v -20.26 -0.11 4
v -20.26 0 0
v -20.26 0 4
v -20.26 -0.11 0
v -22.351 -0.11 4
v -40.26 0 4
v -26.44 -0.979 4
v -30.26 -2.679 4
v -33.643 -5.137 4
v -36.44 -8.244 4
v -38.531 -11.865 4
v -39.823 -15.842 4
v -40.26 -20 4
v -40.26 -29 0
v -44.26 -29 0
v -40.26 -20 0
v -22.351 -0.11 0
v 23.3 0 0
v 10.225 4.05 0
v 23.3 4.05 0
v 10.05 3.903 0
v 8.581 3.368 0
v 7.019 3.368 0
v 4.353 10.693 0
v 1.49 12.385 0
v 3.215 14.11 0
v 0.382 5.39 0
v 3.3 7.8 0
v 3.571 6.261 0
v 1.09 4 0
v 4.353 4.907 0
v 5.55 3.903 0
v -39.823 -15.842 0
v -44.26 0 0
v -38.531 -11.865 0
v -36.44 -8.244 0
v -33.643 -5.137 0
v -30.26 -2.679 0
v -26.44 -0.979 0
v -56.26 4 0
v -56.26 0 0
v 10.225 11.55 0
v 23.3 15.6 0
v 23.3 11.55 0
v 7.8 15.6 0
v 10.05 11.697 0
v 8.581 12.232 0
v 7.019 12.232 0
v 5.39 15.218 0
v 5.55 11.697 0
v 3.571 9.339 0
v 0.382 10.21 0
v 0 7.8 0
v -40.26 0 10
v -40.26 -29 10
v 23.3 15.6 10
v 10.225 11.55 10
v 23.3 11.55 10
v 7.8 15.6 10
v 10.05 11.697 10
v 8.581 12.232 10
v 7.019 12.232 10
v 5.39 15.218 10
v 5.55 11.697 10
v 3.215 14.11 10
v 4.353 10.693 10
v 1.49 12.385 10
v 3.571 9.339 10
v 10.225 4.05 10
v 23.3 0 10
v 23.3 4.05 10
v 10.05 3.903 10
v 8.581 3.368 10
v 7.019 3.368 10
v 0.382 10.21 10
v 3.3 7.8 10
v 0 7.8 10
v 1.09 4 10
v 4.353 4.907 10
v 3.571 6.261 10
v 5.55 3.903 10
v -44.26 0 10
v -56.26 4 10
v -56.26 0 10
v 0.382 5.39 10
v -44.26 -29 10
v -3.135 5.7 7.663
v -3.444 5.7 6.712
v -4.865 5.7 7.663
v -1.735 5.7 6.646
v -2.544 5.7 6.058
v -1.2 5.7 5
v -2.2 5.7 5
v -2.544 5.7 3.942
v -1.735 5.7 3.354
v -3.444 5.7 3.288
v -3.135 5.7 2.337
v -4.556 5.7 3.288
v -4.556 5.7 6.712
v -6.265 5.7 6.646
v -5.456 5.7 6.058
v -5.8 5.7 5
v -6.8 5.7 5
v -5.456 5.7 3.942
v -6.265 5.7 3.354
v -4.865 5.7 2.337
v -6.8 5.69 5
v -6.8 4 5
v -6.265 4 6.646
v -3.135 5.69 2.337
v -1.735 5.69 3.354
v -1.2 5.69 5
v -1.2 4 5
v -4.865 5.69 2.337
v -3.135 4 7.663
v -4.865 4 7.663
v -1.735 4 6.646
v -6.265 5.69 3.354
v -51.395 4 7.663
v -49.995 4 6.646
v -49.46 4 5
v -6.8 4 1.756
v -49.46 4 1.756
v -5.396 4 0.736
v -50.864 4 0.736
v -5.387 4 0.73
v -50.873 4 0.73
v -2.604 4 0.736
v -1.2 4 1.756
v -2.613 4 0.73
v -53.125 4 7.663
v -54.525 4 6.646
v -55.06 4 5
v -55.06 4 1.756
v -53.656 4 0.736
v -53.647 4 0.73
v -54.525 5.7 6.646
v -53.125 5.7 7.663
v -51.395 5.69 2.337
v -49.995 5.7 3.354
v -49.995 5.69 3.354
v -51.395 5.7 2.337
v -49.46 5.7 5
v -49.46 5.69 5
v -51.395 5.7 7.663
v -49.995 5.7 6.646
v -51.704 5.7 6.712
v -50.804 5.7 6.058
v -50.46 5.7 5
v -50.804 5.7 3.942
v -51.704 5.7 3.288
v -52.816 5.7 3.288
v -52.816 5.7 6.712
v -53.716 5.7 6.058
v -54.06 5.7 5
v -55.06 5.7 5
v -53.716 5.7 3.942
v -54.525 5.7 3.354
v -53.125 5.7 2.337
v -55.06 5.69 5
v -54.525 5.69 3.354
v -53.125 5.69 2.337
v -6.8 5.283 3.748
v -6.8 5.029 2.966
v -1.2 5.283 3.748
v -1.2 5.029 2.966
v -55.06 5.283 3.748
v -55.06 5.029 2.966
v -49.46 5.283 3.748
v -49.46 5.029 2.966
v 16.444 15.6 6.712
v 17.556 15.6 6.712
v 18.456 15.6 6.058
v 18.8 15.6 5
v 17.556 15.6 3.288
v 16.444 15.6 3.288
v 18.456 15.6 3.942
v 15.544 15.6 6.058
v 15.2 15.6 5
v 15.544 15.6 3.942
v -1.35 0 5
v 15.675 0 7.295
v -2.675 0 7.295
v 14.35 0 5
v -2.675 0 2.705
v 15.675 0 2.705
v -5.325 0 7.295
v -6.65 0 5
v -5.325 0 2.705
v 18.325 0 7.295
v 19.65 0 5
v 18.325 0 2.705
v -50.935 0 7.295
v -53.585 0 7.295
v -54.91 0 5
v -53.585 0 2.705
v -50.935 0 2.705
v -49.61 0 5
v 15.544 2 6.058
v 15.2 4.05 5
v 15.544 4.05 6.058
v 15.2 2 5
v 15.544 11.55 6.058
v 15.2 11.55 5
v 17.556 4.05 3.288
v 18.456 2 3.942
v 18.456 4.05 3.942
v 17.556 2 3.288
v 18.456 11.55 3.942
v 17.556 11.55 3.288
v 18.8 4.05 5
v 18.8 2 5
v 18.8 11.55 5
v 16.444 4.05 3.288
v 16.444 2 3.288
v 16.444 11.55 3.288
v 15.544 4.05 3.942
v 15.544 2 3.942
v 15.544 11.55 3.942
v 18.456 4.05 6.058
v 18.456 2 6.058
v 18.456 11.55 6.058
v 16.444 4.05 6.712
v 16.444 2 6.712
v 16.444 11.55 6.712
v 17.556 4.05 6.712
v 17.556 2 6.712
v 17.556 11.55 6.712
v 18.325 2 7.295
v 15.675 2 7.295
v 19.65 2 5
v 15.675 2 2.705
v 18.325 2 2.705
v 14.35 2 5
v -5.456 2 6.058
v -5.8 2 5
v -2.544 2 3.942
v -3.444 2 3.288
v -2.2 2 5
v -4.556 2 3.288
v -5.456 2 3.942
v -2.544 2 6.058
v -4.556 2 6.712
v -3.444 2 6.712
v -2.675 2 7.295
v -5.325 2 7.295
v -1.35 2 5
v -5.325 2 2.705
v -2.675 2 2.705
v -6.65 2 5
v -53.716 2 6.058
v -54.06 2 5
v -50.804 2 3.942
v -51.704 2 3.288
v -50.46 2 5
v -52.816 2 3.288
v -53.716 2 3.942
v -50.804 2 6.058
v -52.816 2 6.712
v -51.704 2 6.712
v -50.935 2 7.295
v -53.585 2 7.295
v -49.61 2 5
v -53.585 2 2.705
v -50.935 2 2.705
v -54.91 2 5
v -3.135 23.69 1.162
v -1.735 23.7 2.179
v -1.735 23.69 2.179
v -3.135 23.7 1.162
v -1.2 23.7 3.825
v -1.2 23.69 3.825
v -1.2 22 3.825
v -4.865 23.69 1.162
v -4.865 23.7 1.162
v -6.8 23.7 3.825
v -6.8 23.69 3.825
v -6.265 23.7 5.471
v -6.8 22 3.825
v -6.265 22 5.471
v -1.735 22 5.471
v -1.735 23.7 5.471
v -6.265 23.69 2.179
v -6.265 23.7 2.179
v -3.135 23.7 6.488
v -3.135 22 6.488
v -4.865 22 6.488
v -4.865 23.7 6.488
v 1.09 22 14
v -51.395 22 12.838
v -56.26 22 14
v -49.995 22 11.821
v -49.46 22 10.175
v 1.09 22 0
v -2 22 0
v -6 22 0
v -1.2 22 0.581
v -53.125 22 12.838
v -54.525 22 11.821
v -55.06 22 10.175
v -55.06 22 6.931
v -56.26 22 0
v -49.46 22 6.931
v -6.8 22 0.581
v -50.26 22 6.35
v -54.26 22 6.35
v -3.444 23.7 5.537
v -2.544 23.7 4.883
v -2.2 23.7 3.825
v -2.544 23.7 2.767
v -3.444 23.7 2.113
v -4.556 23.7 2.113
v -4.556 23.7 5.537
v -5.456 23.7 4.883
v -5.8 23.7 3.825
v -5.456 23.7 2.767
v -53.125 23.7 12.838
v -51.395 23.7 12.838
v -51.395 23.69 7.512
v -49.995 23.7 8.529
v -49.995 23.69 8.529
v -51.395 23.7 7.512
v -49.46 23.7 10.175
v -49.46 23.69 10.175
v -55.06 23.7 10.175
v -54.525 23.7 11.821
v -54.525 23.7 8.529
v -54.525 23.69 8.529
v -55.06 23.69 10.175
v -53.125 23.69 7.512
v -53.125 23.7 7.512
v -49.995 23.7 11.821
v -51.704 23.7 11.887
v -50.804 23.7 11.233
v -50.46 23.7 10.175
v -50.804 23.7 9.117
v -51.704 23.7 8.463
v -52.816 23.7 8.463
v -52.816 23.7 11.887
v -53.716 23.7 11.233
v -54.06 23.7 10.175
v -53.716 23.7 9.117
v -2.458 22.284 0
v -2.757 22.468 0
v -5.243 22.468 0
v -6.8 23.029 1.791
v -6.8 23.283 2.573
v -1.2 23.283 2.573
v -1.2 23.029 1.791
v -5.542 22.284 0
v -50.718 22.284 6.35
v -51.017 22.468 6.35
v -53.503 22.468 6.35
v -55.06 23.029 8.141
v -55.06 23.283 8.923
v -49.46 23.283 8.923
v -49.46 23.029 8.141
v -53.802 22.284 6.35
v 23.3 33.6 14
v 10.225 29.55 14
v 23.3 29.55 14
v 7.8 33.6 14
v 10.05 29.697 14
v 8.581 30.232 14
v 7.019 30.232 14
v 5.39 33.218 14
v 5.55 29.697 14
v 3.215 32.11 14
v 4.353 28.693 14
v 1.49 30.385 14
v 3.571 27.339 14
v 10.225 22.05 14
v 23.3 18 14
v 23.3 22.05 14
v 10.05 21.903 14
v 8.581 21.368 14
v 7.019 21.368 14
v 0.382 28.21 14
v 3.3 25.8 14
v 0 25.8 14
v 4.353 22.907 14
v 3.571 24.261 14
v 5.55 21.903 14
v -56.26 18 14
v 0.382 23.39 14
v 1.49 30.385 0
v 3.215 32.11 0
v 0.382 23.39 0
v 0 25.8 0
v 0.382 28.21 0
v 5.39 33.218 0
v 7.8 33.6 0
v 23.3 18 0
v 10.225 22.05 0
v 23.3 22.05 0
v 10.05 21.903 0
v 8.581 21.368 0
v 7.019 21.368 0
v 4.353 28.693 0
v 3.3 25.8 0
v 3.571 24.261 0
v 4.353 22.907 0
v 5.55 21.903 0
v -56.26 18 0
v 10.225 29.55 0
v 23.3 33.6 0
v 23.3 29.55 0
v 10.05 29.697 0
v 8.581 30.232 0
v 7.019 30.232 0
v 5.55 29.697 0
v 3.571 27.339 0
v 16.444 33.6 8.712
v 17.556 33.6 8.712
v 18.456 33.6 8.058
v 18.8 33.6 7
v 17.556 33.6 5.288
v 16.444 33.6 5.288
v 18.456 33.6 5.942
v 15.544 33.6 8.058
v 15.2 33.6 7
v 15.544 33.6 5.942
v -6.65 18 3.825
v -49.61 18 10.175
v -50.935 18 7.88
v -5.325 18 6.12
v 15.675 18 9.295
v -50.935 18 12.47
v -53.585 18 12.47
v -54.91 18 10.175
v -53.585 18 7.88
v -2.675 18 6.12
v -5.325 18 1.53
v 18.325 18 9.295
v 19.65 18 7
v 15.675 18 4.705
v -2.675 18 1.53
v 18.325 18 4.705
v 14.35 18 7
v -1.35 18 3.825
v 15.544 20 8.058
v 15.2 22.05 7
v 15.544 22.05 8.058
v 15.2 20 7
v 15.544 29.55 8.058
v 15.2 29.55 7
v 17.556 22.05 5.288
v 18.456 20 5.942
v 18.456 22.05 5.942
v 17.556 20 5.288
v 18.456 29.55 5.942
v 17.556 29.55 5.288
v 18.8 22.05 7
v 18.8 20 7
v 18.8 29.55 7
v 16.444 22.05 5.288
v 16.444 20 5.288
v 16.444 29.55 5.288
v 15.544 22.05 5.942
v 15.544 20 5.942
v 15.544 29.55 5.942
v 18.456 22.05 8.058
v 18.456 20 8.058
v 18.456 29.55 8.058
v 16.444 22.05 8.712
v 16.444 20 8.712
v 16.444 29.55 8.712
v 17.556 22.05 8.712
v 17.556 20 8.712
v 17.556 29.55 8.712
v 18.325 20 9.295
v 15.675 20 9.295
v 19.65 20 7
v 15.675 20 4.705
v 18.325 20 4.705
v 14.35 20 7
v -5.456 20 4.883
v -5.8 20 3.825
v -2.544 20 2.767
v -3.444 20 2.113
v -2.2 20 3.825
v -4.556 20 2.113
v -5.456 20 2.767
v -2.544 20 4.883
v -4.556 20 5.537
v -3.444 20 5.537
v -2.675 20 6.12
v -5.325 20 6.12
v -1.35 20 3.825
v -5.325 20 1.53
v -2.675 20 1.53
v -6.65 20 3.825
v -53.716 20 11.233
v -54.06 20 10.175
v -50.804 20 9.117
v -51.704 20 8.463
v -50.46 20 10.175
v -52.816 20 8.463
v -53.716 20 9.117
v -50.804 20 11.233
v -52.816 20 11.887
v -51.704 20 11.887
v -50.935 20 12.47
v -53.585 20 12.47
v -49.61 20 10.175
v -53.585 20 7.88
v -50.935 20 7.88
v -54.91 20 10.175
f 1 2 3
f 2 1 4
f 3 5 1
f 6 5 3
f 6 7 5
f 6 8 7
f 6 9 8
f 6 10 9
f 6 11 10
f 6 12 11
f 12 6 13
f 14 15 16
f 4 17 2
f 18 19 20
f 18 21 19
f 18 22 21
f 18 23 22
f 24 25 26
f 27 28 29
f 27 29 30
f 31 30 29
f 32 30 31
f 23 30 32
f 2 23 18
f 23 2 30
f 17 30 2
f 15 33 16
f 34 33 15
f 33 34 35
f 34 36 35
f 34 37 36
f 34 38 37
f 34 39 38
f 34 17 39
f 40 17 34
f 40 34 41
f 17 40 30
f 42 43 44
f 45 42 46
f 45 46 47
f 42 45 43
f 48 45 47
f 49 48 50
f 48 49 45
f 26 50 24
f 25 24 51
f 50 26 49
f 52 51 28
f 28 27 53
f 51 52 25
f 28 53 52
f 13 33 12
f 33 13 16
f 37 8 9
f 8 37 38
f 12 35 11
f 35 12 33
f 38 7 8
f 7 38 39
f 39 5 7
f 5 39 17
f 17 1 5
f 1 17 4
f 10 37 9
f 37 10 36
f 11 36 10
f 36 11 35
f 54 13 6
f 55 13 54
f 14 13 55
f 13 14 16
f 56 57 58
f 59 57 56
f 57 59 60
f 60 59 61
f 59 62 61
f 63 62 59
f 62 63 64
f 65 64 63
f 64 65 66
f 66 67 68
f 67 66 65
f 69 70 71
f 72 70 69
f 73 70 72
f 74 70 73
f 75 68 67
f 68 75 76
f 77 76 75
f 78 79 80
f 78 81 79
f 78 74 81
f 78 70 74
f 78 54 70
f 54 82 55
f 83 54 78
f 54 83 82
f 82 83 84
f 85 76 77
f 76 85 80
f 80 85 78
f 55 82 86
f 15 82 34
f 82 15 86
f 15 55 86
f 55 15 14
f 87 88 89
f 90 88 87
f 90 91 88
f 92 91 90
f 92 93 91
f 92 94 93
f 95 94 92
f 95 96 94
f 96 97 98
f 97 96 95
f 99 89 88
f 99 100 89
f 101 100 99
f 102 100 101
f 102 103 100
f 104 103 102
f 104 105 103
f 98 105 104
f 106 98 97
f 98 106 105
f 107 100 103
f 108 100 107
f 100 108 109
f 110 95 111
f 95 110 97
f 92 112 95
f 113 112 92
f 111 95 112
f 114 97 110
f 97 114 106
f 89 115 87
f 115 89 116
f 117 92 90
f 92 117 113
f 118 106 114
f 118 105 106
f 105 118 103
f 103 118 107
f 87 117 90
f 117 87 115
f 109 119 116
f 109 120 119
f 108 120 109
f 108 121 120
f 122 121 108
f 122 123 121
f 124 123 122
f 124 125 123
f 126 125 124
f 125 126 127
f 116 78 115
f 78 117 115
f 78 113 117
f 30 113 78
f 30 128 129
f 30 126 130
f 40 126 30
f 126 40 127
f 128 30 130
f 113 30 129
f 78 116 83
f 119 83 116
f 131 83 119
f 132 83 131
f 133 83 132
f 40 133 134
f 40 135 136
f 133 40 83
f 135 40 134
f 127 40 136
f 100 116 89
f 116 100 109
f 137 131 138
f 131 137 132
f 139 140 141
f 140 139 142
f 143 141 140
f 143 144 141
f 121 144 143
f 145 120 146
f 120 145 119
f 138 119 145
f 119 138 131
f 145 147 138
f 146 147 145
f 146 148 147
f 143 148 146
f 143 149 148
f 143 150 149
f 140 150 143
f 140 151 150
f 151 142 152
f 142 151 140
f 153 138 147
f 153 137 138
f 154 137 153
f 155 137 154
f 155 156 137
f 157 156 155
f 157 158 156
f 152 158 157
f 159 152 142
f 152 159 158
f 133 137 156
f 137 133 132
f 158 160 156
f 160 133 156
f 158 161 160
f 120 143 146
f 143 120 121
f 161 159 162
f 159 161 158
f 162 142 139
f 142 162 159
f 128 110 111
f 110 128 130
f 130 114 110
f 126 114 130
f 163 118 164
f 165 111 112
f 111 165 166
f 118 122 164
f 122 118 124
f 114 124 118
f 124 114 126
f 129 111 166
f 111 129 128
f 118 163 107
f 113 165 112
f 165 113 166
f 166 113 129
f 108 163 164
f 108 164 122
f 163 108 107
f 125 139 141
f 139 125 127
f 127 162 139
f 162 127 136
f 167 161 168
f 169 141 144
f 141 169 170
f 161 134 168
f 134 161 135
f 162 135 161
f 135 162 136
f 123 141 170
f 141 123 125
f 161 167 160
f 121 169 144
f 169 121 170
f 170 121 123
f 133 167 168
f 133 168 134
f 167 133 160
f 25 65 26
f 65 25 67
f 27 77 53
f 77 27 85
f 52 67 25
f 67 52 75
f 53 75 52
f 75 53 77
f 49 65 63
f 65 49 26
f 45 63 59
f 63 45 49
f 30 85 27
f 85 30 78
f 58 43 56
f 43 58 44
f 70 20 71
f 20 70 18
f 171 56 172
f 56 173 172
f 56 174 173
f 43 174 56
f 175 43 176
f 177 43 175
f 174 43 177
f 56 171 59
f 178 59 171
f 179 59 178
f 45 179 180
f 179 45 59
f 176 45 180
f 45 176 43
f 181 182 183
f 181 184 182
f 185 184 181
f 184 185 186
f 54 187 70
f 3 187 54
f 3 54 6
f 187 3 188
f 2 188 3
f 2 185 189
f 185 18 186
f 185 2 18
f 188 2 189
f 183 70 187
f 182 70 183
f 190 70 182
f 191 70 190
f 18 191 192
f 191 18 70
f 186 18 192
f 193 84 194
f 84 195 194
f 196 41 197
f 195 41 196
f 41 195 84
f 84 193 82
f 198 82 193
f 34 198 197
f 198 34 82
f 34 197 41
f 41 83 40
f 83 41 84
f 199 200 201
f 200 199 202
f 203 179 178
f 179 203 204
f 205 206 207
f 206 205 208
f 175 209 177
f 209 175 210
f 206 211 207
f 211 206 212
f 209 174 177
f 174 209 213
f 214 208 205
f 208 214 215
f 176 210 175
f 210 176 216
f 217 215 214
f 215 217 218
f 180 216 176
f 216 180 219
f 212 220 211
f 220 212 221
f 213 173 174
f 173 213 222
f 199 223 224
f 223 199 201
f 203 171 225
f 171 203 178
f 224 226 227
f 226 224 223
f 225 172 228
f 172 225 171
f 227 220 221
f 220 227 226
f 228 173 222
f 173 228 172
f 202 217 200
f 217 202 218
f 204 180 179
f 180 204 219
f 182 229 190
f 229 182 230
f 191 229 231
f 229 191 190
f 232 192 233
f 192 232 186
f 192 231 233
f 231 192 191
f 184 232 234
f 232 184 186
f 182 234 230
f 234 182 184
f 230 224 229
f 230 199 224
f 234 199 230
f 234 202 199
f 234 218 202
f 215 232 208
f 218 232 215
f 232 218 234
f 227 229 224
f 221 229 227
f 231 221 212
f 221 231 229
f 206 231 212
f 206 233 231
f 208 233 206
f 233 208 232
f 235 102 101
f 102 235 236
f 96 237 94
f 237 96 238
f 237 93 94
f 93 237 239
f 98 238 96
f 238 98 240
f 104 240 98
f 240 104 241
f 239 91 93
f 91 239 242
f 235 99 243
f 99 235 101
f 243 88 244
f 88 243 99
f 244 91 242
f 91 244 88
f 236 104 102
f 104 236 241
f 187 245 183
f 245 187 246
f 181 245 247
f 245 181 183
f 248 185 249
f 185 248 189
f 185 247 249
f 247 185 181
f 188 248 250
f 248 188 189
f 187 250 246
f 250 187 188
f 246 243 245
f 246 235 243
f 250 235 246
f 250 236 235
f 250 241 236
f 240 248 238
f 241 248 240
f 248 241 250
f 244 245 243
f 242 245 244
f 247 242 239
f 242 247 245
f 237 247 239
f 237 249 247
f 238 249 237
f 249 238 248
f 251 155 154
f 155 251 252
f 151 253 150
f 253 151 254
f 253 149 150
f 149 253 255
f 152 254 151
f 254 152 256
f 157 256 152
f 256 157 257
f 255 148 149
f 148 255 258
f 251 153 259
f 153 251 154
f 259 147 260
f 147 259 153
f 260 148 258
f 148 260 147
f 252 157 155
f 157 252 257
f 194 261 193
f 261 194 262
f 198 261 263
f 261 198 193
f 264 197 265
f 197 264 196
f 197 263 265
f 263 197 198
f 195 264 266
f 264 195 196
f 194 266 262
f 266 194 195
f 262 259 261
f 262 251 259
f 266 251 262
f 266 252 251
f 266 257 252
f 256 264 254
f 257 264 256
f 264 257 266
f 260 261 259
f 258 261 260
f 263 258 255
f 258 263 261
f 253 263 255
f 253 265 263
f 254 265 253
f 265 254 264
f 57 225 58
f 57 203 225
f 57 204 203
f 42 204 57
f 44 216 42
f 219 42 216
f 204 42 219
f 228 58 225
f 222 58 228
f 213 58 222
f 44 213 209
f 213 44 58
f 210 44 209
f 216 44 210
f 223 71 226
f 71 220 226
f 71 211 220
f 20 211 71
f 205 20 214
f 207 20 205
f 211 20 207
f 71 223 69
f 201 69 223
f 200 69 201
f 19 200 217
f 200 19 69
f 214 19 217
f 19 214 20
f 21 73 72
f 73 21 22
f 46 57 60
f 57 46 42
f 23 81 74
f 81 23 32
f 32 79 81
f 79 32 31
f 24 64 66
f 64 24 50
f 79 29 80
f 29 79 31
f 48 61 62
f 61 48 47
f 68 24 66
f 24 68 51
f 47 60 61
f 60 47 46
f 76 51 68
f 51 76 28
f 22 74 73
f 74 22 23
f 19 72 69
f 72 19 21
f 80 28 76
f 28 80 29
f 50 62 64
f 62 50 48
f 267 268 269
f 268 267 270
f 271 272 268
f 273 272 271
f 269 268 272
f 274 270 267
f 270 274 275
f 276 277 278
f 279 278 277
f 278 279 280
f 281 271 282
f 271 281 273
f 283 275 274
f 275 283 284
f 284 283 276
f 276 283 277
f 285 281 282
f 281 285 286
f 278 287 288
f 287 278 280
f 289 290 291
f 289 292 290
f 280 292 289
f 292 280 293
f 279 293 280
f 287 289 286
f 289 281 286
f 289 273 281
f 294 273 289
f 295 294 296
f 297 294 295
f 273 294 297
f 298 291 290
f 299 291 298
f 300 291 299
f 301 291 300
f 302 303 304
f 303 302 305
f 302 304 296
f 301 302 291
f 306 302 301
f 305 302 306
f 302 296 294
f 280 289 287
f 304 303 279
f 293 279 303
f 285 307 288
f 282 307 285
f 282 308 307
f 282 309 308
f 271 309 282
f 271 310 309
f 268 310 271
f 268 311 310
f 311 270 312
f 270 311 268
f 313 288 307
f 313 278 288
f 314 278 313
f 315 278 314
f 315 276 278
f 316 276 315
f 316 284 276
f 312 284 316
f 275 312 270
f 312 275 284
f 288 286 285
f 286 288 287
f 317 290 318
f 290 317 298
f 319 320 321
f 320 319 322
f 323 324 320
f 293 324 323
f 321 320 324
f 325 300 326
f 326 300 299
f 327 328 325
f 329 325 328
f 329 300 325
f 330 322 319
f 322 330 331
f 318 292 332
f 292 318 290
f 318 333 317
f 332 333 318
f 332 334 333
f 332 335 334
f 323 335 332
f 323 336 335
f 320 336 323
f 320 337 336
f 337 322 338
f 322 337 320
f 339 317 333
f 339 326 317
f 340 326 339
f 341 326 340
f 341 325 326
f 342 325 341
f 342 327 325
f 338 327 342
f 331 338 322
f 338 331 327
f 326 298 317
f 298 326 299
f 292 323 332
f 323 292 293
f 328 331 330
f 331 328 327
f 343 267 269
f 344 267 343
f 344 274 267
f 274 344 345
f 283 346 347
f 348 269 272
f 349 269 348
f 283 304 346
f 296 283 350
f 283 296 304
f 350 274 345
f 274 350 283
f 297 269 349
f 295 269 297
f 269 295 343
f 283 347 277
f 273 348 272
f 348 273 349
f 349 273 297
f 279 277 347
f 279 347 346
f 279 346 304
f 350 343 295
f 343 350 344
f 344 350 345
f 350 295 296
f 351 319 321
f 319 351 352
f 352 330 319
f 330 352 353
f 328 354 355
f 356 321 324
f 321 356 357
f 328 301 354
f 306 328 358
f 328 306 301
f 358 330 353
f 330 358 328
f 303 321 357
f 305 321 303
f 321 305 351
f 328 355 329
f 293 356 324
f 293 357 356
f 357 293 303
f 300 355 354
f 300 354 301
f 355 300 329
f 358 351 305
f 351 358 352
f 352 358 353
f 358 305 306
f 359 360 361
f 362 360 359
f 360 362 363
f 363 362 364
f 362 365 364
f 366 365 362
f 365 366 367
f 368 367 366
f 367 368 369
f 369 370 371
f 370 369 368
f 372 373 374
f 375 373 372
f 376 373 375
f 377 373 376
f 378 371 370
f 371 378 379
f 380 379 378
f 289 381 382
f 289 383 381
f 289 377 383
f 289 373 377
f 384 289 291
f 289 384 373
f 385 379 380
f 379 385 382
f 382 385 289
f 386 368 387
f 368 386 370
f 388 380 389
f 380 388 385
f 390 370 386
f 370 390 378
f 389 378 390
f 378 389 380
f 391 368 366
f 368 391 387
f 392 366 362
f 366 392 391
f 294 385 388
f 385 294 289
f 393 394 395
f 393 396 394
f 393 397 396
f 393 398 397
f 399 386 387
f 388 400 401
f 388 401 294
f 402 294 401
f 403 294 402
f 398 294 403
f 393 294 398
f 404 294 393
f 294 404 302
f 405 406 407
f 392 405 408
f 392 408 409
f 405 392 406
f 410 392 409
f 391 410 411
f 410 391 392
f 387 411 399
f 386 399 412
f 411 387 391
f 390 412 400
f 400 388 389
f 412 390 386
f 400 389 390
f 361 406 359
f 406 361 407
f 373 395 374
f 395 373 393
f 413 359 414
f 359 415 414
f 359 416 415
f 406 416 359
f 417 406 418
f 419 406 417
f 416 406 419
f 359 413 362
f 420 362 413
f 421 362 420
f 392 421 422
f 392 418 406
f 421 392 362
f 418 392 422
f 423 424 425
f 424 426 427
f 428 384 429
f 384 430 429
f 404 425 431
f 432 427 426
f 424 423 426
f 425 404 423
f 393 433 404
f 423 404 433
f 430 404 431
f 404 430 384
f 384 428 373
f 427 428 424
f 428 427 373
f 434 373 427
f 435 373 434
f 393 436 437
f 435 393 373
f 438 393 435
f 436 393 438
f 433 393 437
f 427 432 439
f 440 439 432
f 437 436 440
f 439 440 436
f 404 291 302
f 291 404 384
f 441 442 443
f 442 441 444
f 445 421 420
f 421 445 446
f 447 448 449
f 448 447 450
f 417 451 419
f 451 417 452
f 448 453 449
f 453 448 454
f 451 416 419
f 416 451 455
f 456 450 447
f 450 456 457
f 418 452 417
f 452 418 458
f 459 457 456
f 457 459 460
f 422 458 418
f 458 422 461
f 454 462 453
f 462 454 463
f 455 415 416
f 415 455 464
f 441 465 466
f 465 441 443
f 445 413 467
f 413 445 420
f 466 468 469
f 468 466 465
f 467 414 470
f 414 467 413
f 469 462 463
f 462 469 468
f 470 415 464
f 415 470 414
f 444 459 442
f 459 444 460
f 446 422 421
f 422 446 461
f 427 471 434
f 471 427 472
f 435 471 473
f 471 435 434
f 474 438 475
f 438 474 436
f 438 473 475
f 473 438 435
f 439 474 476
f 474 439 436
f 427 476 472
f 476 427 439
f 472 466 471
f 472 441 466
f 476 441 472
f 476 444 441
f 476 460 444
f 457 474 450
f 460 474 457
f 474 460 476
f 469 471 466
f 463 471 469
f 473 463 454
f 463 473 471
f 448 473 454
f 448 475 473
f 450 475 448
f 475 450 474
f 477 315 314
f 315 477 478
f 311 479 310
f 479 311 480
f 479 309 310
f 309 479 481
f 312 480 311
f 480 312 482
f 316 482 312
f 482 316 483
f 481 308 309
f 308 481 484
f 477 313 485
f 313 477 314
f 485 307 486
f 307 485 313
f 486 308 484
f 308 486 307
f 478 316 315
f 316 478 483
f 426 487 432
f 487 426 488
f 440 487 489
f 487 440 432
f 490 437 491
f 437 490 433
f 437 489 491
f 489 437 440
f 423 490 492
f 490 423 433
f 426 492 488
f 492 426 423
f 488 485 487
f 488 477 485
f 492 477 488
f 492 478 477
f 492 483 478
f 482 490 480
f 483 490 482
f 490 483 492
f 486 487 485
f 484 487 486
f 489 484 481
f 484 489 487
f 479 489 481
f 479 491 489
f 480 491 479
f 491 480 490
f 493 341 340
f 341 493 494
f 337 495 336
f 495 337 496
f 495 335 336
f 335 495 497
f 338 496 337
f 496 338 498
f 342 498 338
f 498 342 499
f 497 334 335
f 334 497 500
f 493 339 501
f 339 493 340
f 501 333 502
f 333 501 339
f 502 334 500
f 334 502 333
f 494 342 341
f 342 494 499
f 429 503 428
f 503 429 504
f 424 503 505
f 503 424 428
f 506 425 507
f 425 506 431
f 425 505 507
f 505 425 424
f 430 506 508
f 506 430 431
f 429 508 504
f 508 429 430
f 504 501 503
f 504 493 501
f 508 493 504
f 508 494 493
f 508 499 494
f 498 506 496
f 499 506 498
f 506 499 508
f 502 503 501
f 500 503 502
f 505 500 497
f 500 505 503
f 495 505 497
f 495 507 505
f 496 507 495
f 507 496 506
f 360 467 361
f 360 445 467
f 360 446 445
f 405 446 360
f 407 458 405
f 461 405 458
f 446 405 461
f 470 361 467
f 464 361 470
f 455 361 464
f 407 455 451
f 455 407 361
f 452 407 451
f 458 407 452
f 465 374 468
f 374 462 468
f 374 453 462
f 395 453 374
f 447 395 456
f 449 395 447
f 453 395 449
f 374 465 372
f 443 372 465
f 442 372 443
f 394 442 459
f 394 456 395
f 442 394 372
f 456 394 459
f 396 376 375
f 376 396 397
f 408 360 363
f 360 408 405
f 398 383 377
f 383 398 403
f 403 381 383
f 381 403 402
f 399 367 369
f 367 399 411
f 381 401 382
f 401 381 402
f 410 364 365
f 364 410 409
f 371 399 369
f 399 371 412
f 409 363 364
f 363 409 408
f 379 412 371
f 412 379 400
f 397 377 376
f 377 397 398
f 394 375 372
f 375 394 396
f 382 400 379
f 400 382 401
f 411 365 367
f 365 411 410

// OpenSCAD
// file: functions.scad
// PRUSA Mendel  
// Functions used in many files
// GNU GPL v3
// Josef Průša
// josefprusa@me.com
// prusadjs.cz
// http://www.reprap.org/wiki/Prusa_Mendel
// http://github.com/prusajr/PrusaMendel


module nut(d,h,horizontal=true){
cornerdiameter =  (d / 2) / cos (180 / 6);
cylinder(h = h, r = cornerdiameter, $fn = 6);
if(horizontal){
for(i = [1:6]){
	rotate([0,0,60*i]) translate([-cornerdiameter-0.2,0,0]) rotate([0,0,-45]) cube(size = [2,2,h]);
}}
}

// Based on nophead research
module polyhole(d,h) {
    n = max(round(2 * d),3);
    rotate([0,0,180])
        cylinder(h = h, r = (d / 2) / cos (180 / n), $fn = n);
}




module roundcorner(diameter){
	difference(){
		cube(size = [diameter,diameter,99], center = false);
		translate(v = [diameter, diameter, 0]) cylinder(h = 100, r=diameter, center=true);
	}
}
// file: metric.scad
// PRUSA Mendel  
// Default metric sizes
// GNU GPL v3
// Josef Průša
// josefprusa@me.com
// prusadjs.cz
// http://www.reprap.org/wiki/Prusa_Mendel
// http://github.com/prusajr/PrusaMendel

// DONT CHANGE THIS FILE! ALTER VALUES IN CONFIGURATION.SCAD INSTEAD

// RODS

threaded_rod_diameter = 8.7;
threaded_rod_diameter_horizontal = 8.7;
smooth_bar_diameter = 8;
smooth_bar_diameter_horizontal = 8.5;

// Nuts and bolts

m8_diameter = 9;
m8_nut_diameter = 14.1;

m4_diameter = 4.5;
m4_nut_diameter = 9;

m3_diameter = 3.6;
m3_nut_diameter = 5.3;
m3_nut_diameter_horizontal = 6.1;

// Bushing holder

bushing_core_diameter = smooth_bar_diameter;
bushing_material_thickness = 1;

// Motors

motor_shaft = 5.5;
// file: configuration.scad
// PRUSA Mendel  
// Configuration file
// GNU GPL v3
// Josef Průša
// josefprusa@me.com
// prusadjs.cz
// http://www.reprap.org/wiki/Prusa_Mendel
// http://github.com/prusajr/PrusaMendel

// PLEASE SELECT ONE OF THE CONFIGURATIONS BELOW
// BY UN-COMMENTING IT

// Uncomment for metric settings
// METRIC METRIC METRIC METRIC METRIC METRIC METRIC METRIC 

include <metric.scad>;

// CUSTOM CUSTOM CUSTOM CUSTOM CUSTOM CUSTOM CUSTOM CUSTOM CUSTOM

thin_wall = 3;


// Linear bearing version
linear = false;
// set false for LM-8UU, true for LM-E-8UU (ignore if linear is set to false)
lme8uu = false;



// CHANGE ONLY THE STUFF YOU KNOW
// IT WILL REPLACE DEFAULT SETTING

// RODS

// threaded_rod_diameter = 0;
// threaded_rod_diameter_horizontal = 0;
// smooth_bar_diameter = 0;
// smooth_bar_diameter_horizontal = 0;

// Nuts and bolts

// m8_diameter = 0;
// m8_nut_diameter = 0;

// m4_diameter = 0;
// m4_nut_diameter = 0;

// m3_diameter = 0;
// m3_nut_diameter = 0;

// Bushing holder

// bushing_core_diameter = smooth_bar_diameter;
// bushing_material_thickness = 0;


///counted stuff
m3_nut_diameter_bigger = ((m3_nut_diameter  / 2) / cos (180 / 6))*2;

// functions 
include <functions.scad>
// main file
// PRUSA Mendel  
// Endstop holder
// Used to attach endstops to 8mm rods
// GNU GPL v2
// Josef Průša
// josefprusa@me.com
// prusadjs.cz
// http://www.reprap.org/wiki/Prusa_Mendel
// http://github.com/prusajr/PrusaMendel

include <configuration.scad>

/**
 * @name Endstop holder
 * @category Printed
 * @using 1 m3x20
 * @using 1 m3nut
 * @using 2 m3washer
 */
module ramps_holder(hole_offset=0,endstop_width=10,with_foot=false){
	outer_diameter= m8_diameter+3.3*2;
	screw_hole_spacing=48.26;
	opening_size = m8_diameter-1.5; //openingsize
	foot_height=29;
	difference()
	{
		union()
		{
			translate([outer_diameter/2, outer_diameter/2, 0]) 
			cylinder(h=endstop_width, r = outer_diameter/2, $fn = 20);
			translate([outer_diameter/2, 0, 0]) 
			cube([15.5,outer_diameter,endstop_width]);
			translate([-(screw_hole_spacing+8), 0, 0]) 
			cube([screw_hole_spacing+8+10, 4, endstop_width]);

			if (with_foot)
			{
				translate([-screw_hole_spacing+4,-foot_height,0])
				cube([4, foot_height+1, endstop_width]);
				translate([-screw_hole_spacing+4+3,-20,0])
				difference()
				{
				cube([21, 21, 4]);
				translate([21,0,-1])
				cylinder(r=20,h=6);
				}
			}

			for(hole=[-1,1])
			translate([-4-screw_hole_spacing/2-screw_hole_spacing/2*hole,
				4,endstop_width/2+hole*hole_offset/2]) 
			rotate([-90, 0, 0]) 
			cylinder(h=1.7, r = m3_diameter/2+1, $fn = 10);

			for(hole=[-1,1])
			translate([-4-screw_hole_spacing/2-screw_hole_spacing/2*hole,
				3.99,endstop_width/2+hole*hole_offset/2]) 
			rotate([-90, 0, 0]) 
			render()
			intersection()
			{
			cylinder(h=1.7, r2 = m3_diameter/2+1,r1 = m3_diameter/2+2.7, $fn = 10);
			translate([-m3_diameter/2-1,0,0])
			cube([m3_diameter+2,endstop_width/2-hole_offset/2,1.7]);
			}
		}
	
		translate([9, outer_diameter/2-opening_size/2,-1]) 
		cube([18,opening_size,endstop_width+2]);
		translate([outer_diameter/2, outer_diameter/2, -1]) 
		cylinder(h=endstop_width+2, r = m8_diameter/2, $fn = 18);

		translate([17,-1,endstop_width/2]) 
		rotate([-90, 0, 0]) 
		{
			cylinder(h=outer_diameter+2, r = m3_diameter/2, $fn = 10);
			cylinder(h=3, r = m3_nut_diameter/2, $fn = 6);
		}

		for(hole=[-1,1])
		translate([-4-screw_hole_spacing/2-screw_hole_spacing/2*hole,
			-1,endstop_width/2+hole*hole_offset/2]) 
		rotate([-90, 0, 0]) 
		{
			cylinder(h=outer_diameter+2, r = m3_diameter/2, $fn = 10);
			cylinder(h=3, r = m3_nut_diameter/2, $fn = 6);
		}
	}
}

module rampsholder()
{
	ramps_holder(hole_offset=0,endstop_width=10,with_foot=true);
	translate([0,18,0])
	ramps_holder(hole_offset=6.35,endstop_width=14);
}

rampsholder();
